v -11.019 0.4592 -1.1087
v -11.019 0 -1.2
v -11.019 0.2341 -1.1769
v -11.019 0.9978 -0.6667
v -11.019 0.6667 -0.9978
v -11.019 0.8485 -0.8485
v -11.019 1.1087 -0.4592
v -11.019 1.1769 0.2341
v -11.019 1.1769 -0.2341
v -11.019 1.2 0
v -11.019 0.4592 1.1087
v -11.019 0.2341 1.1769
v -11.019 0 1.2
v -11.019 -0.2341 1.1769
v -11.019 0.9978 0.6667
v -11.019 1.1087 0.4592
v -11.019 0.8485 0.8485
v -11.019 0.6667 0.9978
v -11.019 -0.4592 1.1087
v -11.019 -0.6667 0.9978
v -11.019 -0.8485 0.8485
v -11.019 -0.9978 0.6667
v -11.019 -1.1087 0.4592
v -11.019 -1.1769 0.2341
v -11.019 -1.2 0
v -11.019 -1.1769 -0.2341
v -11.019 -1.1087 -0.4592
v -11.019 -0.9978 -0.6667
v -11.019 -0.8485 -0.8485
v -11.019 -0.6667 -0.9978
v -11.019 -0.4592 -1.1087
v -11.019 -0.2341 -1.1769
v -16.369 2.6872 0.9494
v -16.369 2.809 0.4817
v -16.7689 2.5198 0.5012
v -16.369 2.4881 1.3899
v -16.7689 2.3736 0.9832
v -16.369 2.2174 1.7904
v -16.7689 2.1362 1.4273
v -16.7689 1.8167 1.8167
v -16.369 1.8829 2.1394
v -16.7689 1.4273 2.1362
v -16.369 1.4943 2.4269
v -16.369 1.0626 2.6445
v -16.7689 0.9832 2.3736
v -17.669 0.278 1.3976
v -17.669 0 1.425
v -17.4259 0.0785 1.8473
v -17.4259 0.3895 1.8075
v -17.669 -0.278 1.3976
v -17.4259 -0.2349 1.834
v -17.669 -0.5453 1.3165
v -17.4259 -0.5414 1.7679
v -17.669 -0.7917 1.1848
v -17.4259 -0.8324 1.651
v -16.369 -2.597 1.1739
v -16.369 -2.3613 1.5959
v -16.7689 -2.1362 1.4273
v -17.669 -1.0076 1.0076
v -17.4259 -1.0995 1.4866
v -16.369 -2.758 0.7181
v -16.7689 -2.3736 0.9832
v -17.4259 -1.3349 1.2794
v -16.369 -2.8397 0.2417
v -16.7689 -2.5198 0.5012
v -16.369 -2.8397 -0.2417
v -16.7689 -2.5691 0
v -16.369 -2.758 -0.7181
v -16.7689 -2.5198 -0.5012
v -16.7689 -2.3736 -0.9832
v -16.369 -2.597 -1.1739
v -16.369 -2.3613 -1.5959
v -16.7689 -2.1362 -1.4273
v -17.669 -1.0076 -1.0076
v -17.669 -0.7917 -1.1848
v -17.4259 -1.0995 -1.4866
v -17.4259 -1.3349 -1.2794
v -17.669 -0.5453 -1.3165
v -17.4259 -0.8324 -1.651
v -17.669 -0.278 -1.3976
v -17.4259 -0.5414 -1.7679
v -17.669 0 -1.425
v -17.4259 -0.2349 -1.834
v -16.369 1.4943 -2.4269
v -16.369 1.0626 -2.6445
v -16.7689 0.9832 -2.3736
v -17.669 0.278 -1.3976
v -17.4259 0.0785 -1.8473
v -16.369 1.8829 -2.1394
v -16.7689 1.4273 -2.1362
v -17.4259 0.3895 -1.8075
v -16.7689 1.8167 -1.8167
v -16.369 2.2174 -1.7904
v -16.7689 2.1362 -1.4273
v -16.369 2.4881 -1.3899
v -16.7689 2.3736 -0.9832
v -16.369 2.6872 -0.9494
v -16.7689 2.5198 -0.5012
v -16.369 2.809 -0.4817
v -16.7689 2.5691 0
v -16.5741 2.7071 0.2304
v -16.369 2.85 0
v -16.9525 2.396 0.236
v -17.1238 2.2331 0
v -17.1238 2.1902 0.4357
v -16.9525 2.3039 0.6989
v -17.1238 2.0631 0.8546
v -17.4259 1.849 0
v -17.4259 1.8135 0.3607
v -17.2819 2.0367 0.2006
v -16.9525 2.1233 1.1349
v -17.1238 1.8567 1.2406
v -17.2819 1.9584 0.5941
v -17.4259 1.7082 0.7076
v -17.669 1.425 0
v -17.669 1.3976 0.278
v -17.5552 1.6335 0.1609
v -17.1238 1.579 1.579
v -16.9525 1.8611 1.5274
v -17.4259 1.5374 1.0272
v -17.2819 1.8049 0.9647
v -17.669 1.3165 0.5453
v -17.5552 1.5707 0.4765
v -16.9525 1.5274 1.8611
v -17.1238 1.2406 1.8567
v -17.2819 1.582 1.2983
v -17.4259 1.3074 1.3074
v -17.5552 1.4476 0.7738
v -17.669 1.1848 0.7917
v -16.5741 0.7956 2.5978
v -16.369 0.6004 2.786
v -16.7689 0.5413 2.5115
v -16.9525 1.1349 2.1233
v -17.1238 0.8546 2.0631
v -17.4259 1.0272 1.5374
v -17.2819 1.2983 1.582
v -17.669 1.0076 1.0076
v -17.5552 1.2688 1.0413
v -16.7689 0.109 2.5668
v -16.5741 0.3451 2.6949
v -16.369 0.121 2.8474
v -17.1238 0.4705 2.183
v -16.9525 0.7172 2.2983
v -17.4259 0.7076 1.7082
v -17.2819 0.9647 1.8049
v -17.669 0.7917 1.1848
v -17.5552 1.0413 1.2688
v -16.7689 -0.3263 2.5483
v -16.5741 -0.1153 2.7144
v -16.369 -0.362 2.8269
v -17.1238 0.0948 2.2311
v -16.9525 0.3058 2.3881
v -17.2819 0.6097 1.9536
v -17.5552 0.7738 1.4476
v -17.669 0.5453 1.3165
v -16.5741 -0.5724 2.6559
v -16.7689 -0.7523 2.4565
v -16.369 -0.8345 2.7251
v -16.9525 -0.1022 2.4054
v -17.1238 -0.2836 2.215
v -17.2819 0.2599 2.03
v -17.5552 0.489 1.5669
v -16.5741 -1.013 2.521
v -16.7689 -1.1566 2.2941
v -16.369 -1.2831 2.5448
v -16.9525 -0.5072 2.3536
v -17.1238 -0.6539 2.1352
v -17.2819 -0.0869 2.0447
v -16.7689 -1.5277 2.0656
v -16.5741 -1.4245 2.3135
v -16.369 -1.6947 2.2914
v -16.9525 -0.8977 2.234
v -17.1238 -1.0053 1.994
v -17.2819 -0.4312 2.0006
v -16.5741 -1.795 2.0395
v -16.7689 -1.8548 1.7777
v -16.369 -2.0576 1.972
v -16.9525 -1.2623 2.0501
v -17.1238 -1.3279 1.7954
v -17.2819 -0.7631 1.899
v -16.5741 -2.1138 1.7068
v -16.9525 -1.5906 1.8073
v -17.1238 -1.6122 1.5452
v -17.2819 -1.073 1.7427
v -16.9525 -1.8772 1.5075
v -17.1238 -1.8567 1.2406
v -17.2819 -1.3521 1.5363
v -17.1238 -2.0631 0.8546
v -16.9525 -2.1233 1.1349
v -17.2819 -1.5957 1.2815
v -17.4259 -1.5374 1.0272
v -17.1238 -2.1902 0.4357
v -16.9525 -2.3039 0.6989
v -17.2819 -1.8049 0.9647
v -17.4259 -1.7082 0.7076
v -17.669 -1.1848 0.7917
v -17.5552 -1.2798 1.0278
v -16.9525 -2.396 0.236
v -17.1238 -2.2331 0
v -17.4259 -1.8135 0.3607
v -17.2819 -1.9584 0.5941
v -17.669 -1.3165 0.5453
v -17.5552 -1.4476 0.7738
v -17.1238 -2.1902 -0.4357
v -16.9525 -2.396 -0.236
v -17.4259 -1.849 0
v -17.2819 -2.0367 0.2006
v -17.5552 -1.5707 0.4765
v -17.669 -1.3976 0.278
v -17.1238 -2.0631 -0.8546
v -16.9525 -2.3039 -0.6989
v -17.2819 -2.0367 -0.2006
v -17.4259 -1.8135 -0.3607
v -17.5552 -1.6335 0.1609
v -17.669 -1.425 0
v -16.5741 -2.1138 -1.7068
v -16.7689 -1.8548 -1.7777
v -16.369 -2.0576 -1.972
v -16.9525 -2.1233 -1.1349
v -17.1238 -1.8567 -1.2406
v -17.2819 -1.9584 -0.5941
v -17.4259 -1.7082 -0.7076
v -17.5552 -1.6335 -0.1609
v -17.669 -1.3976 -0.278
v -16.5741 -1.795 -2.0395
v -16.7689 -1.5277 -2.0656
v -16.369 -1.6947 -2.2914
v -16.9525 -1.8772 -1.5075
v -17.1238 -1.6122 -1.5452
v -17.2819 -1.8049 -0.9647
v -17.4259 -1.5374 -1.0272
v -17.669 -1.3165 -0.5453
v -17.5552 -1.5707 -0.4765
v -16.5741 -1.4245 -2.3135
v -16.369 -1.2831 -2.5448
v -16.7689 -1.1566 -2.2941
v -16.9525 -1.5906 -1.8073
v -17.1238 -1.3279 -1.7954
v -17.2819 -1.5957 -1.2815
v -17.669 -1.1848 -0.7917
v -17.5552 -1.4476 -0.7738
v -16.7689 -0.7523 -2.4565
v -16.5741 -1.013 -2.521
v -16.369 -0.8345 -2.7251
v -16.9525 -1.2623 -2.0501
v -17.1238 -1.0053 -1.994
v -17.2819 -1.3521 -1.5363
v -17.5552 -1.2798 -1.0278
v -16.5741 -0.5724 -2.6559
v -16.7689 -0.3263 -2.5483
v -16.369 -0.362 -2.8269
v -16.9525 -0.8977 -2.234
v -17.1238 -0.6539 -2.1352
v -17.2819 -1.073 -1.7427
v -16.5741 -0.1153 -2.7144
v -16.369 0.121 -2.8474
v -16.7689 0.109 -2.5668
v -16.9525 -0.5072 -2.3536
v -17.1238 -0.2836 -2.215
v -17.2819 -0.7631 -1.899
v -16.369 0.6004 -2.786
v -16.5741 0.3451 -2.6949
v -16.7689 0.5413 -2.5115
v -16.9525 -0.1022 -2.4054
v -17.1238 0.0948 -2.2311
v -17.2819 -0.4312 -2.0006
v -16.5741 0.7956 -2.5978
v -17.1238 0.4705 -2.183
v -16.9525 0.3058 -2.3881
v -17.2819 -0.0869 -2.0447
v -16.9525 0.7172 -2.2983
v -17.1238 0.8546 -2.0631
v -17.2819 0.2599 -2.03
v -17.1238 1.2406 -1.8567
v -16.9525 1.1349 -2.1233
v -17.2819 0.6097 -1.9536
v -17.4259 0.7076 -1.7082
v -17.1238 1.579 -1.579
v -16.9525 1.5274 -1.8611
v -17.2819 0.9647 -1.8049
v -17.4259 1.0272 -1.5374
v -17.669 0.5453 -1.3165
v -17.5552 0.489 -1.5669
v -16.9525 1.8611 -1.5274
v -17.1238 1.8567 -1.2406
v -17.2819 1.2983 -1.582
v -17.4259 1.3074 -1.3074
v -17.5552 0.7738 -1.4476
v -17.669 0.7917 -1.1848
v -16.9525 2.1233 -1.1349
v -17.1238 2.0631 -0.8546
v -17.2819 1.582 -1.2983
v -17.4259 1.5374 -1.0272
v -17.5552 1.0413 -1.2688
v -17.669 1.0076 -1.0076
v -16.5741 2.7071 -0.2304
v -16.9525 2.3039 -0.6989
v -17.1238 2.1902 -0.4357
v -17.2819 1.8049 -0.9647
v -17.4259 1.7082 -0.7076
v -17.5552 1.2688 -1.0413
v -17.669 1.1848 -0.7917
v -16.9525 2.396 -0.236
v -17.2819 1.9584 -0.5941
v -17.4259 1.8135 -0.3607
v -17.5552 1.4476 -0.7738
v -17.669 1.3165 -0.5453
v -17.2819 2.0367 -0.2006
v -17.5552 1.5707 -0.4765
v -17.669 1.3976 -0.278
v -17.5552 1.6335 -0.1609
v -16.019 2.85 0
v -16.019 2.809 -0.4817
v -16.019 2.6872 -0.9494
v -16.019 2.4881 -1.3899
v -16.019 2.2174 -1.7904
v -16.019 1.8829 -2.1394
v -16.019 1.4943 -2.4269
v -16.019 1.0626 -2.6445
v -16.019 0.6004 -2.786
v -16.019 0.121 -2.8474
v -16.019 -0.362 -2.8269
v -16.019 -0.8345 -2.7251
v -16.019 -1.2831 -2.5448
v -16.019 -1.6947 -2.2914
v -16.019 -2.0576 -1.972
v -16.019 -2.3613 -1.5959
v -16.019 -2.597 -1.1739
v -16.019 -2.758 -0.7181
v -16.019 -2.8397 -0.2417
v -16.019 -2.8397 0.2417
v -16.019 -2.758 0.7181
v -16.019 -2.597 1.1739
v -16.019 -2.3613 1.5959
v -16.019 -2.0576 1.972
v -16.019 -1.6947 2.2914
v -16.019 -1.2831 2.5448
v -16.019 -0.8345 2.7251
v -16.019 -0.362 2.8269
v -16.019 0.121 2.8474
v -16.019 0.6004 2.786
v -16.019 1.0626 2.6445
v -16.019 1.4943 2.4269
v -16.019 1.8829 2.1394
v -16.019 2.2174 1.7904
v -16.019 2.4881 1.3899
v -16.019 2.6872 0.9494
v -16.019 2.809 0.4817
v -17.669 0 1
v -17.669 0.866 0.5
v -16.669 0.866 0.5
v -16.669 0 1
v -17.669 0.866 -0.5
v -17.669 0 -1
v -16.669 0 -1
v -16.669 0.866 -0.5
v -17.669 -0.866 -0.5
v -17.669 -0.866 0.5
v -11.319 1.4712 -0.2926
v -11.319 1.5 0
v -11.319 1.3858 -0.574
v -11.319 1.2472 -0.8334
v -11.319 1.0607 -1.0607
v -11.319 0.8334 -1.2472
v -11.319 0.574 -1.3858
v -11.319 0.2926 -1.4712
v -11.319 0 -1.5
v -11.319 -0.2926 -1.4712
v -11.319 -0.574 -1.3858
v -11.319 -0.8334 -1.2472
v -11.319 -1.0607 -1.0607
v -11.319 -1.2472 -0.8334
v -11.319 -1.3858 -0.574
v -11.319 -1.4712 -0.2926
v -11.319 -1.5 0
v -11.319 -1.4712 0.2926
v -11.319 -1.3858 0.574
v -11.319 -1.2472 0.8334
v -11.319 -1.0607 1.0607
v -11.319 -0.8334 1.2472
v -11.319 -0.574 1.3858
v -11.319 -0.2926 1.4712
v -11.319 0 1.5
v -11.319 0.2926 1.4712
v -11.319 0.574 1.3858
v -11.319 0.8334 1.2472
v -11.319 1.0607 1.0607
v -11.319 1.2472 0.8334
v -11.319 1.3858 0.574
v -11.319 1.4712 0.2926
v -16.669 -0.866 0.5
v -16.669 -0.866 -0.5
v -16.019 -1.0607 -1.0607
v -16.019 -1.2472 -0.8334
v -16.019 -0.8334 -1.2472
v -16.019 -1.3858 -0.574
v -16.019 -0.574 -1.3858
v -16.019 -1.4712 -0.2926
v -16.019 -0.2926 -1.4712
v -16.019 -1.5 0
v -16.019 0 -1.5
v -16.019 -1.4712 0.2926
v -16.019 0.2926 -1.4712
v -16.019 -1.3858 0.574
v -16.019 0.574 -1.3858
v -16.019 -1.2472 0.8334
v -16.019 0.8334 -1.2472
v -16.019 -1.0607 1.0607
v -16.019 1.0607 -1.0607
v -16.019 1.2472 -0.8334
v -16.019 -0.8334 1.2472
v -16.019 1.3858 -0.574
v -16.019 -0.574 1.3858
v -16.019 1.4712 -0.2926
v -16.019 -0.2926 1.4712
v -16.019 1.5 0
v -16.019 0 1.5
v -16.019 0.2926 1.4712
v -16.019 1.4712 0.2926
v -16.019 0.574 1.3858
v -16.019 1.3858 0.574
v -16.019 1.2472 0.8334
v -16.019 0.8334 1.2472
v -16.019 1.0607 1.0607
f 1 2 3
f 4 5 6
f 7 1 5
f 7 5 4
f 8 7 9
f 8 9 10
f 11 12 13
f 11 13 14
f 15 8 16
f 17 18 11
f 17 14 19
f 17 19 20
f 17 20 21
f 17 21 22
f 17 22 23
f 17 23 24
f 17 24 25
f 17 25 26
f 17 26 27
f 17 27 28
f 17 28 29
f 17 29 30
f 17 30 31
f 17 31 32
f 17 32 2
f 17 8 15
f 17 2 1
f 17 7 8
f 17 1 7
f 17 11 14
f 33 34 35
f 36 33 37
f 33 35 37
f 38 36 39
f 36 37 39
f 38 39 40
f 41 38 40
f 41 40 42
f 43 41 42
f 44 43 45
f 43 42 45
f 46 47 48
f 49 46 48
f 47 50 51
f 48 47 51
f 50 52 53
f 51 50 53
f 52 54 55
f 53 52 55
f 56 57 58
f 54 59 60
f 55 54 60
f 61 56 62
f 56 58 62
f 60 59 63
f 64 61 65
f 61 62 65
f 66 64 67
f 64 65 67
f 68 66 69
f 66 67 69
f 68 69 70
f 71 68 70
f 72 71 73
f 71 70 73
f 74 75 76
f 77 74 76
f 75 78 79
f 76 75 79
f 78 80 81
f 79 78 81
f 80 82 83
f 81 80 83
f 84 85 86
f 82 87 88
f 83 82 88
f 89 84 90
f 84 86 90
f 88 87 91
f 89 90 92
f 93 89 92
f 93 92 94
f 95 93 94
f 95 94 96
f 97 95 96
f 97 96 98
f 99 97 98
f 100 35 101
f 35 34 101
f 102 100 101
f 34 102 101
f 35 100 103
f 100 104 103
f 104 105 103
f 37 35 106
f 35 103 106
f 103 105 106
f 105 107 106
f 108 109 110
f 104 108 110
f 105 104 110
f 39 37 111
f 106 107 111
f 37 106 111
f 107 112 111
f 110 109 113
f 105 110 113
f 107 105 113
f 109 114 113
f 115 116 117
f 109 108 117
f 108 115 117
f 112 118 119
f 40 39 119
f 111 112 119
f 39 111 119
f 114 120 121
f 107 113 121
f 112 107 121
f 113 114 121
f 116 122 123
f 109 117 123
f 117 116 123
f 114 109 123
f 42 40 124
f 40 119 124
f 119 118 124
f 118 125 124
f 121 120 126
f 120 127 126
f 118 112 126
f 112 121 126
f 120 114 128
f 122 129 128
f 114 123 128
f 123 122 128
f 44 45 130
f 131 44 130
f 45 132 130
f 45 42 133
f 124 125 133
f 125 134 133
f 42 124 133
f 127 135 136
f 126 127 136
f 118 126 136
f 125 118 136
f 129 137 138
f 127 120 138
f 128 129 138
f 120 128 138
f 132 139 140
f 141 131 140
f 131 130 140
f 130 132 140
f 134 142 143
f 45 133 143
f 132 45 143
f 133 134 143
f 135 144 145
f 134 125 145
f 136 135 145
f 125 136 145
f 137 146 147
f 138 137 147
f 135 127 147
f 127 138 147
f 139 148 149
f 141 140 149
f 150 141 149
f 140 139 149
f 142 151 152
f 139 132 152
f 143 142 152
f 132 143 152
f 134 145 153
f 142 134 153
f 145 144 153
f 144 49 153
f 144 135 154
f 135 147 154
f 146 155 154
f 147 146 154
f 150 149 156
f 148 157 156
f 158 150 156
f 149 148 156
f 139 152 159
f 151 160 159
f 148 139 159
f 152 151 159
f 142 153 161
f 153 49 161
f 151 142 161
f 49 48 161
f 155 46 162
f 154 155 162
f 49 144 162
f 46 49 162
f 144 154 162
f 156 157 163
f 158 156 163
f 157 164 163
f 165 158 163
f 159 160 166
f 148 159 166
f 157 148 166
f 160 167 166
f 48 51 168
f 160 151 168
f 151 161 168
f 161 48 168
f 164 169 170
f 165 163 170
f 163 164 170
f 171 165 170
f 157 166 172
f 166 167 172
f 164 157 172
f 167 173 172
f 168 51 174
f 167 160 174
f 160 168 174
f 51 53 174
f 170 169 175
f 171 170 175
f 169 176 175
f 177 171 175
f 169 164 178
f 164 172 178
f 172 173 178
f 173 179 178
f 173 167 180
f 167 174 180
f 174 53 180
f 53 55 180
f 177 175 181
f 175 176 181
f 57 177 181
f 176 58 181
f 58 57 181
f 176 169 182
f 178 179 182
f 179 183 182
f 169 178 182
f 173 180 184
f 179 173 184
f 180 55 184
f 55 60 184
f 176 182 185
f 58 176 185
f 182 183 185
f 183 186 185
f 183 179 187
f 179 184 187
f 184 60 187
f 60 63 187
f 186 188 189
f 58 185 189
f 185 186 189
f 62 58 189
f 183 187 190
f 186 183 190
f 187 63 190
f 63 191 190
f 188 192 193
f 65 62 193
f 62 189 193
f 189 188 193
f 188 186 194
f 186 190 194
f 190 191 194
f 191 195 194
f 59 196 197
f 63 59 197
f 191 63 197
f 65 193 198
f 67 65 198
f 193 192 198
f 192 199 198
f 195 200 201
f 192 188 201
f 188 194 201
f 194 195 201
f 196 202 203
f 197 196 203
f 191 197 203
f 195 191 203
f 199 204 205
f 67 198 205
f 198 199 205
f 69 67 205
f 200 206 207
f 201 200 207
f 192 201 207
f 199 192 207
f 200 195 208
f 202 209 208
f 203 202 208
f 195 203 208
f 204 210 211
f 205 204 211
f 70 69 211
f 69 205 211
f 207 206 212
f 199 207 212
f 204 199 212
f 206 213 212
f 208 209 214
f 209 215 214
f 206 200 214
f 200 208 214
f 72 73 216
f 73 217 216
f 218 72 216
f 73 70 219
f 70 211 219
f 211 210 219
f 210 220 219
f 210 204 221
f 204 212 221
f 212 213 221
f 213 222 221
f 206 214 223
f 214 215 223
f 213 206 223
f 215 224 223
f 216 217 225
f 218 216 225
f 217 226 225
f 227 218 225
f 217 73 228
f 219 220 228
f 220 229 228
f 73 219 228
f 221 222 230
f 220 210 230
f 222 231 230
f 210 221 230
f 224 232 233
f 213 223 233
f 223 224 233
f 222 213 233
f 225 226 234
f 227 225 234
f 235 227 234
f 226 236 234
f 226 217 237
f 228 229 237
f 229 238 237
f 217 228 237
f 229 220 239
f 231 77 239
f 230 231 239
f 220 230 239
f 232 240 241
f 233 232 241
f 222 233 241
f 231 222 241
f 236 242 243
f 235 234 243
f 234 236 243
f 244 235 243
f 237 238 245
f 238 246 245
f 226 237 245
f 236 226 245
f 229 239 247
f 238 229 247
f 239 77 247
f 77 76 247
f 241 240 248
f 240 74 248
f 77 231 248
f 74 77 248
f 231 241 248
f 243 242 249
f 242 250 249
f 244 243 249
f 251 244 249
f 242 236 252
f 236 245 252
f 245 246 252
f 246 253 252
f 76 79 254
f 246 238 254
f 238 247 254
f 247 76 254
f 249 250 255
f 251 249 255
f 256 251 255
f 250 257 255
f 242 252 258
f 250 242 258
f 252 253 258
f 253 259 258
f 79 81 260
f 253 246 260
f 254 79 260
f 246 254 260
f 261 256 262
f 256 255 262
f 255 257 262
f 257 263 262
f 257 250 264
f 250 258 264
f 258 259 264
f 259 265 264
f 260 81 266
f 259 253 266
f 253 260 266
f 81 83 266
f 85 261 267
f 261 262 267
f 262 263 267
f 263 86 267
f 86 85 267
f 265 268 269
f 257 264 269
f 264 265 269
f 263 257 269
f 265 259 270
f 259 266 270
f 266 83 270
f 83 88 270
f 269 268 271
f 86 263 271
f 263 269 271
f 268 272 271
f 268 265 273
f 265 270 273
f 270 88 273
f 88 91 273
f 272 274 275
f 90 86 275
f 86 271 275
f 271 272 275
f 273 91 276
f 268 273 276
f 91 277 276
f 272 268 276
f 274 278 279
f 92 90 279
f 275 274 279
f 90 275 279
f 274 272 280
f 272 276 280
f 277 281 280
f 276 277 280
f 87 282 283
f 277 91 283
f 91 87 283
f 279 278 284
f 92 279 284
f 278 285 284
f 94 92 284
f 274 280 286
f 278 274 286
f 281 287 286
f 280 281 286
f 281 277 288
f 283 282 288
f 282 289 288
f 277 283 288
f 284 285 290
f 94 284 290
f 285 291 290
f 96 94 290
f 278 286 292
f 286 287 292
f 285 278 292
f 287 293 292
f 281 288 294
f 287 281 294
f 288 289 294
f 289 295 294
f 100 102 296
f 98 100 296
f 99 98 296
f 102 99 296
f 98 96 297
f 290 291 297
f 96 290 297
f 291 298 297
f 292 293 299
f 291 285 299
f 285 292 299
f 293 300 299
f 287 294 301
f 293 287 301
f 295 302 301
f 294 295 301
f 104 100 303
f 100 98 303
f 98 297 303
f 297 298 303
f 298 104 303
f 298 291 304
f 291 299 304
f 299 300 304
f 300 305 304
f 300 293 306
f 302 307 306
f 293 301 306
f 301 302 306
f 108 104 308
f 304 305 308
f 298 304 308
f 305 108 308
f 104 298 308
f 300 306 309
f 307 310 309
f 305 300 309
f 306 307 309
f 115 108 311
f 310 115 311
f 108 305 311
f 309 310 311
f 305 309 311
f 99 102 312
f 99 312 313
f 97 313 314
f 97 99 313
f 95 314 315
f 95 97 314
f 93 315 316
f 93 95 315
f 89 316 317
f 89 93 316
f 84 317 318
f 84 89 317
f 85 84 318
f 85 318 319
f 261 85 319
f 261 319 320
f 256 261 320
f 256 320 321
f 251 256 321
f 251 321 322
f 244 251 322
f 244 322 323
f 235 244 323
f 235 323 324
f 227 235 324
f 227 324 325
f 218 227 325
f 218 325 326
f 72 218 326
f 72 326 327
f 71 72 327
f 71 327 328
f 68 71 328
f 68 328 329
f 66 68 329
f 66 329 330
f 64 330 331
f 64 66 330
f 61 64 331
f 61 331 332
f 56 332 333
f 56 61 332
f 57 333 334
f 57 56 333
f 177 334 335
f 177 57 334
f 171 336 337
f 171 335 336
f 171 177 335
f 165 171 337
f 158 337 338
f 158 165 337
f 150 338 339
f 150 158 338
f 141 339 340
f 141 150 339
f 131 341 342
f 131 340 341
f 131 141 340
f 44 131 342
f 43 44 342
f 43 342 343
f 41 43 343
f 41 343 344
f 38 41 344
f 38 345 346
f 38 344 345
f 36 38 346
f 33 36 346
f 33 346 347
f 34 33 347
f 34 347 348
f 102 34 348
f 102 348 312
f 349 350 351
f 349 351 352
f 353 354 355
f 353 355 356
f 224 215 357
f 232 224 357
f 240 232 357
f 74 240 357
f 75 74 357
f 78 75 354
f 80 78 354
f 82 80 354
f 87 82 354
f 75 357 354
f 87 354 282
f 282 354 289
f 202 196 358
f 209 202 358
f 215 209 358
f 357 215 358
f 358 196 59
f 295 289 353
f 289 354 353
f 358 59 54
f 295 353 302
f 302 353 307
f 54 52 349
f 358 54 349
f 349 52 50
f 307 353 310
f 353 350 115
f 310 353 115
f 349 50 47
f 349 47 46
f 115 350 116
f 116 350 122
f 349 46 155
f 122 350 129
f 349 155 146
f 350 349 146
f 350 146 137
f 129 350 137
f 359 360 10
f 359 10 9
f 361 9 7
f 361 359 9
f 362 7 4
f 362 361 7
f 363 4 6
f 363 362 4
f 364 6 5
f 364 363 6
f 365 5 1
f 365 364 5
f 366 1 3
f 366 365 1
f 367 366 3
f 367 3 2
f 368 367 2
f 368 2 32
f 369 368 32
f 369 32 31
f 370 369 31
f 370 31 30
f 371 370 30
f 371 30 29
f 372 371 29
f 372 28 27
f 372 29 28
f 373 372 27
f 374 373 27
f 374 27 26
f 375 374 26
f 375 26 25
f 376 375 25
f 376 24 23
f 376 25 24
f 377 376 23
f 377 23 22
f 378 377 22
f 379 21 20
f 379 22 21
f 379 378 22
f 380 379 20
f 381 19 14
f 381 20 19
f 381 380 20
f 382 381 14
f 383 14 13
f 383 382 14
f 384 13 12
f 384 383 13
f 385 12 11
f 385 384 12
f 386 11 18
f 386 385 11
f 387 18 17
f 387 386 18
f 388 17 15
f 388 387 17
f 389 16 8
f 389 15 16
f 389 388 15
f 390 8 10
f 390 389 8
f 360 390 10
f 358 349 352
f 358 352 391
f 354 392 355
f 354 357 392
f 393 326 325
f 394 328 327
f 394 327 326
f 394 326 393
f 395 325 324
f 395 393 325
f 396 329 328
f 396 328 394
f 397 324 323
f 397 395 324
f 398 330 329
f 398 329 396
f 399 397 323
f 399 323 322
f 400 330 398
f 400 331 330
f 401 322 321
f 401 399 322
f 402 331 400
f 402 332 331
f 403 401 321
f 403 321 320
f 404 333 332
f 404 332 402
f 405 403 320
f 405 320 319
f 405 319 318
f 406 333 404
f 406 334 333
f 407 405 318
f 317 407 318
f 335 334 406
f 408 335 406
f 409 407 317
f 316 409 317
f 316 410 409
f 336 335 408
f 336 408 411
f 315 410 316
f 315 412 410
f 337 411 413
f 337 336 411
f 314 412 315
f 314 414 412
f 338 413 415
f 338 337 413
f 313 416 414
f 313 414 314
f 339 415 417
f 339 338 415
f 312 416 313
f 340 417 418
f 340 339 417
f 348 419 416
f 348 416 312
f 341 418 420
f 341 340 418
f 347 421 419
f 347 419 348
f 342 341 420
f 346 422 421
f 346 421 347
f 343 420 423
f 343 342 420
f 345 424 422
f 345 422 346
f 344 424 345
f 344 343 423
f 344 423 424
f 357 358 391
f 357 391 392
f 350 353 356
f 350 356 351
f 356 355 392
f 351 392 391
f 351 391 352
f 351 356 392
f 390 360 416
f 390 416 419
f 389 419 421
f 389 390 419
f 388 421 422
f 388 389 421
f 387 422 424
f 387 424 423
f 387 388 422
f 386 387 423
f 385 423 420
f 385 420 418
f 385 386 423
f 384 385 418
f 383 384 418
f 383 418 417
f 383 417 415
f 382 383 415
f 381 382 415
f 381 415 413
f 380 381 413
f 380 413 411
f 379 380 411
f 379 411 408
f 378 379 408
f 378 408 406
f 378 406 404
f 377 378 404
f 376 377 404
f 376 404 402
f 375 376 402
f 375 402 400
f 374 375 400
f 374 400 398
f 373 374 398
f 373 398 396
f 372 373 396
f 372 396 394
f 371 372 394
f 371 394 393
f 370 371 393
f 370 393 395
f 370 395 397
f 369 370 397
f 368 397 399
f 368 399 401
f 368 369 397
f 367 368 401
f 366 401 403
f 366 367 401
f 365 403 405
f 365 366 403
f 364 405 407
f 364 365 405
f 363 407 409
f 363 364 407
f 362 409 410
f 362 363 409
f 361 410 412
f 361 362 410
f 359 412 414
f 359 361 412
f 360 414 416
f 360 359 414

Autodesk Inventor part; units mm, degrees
ref_plane "YZ Plane" through (0, 0, 0) normal (1, 0, 0) x (0, 1, 0)
ref_plane "XZ Plane" through (0, 0, 0) normal (0, 1, 0) x (-1, 0, 0)
ref_plane "XY Plane" through (0, 0, 0) normal (0, 0, 1) x (1, 0, 0)
sketch "Sketch1" plane through (0, 0, 0) normal (0, 0, 1) x (1, 0, 0)
  line L0 (-16.019, 0) -> (-11.019, 0)
  line L1 (-16.019, 1.5) -> (-11.319, 1.5)
  line L2 (-16.019, 0) -> (-16.019, 2.85)
  line L3 (-17.669, 0) -> (-17.669, 1.425)
  line L4 (-11.019, 1.2) -> (-11.019, 0)
  line L5 (-16.369, 0) -> (-16.369, 2.85)
  line L6 (-16.019, 2.85) -> (-16.369, 2.85)
  arc A0 (-16.369, 2.85) -> (-17.669, 1.425) centre (-14.6489, -0.0247) ccw
  line L7 (-11.319, 1.5) -> (-11.019, 1.2)
  line L8 (-16.019, 0) -> (-17.669, 0)
  point P0 (0, 0)
  point P1 (-11.019, 1.5)
  dimension "d0" = 5
  dimension "d1" = 1.5
  dimension "d2" = 2.85
  dimension "d3" = 1.425
  dimension "d4" = 1.65
  dimension "d5" = 2.85
  dimension "d6" = 0.35
  dimension "d7" = 3.35
  dimension "d8" = 0.3
  dimension "d9" = 45
revolve "Revolution1" add sketch "Sketch1" angle 360 about axis through (-16.019, 0, 0) along (1, 0, 0)
sketch "Sketch2" plane through (-17.669, 0, 0) normal (-1, 0, 0) x (0, 0, 1)
  line L0 (-1, 0) -> (-0.5, 0.866)
  line L1 (-0.5, 0.866) -> (0.5, 0.866)
  line L2 (0.5, 0.866) -> (1, 0)
  line L3 (1, 0) -> (0.5, -0.866)
  line L4 (0.5, -0.866) -> (-0.5, -0.866)
  line L5 (-0.5, -0.866) -> (-1, 0)
  point P0 (0, 0)
  point P1 (0, 0)
  dimension "d11" = 2
extrude "Extrusion1" cut sketch "Sketch2" against normal blind 1
thread "Thread1" size "M3x0.5" class "6g" standard "ANSI Metric M Profile" full length
properties part number "bolt_2_5mm" material "Steel, Mild, Welded"
